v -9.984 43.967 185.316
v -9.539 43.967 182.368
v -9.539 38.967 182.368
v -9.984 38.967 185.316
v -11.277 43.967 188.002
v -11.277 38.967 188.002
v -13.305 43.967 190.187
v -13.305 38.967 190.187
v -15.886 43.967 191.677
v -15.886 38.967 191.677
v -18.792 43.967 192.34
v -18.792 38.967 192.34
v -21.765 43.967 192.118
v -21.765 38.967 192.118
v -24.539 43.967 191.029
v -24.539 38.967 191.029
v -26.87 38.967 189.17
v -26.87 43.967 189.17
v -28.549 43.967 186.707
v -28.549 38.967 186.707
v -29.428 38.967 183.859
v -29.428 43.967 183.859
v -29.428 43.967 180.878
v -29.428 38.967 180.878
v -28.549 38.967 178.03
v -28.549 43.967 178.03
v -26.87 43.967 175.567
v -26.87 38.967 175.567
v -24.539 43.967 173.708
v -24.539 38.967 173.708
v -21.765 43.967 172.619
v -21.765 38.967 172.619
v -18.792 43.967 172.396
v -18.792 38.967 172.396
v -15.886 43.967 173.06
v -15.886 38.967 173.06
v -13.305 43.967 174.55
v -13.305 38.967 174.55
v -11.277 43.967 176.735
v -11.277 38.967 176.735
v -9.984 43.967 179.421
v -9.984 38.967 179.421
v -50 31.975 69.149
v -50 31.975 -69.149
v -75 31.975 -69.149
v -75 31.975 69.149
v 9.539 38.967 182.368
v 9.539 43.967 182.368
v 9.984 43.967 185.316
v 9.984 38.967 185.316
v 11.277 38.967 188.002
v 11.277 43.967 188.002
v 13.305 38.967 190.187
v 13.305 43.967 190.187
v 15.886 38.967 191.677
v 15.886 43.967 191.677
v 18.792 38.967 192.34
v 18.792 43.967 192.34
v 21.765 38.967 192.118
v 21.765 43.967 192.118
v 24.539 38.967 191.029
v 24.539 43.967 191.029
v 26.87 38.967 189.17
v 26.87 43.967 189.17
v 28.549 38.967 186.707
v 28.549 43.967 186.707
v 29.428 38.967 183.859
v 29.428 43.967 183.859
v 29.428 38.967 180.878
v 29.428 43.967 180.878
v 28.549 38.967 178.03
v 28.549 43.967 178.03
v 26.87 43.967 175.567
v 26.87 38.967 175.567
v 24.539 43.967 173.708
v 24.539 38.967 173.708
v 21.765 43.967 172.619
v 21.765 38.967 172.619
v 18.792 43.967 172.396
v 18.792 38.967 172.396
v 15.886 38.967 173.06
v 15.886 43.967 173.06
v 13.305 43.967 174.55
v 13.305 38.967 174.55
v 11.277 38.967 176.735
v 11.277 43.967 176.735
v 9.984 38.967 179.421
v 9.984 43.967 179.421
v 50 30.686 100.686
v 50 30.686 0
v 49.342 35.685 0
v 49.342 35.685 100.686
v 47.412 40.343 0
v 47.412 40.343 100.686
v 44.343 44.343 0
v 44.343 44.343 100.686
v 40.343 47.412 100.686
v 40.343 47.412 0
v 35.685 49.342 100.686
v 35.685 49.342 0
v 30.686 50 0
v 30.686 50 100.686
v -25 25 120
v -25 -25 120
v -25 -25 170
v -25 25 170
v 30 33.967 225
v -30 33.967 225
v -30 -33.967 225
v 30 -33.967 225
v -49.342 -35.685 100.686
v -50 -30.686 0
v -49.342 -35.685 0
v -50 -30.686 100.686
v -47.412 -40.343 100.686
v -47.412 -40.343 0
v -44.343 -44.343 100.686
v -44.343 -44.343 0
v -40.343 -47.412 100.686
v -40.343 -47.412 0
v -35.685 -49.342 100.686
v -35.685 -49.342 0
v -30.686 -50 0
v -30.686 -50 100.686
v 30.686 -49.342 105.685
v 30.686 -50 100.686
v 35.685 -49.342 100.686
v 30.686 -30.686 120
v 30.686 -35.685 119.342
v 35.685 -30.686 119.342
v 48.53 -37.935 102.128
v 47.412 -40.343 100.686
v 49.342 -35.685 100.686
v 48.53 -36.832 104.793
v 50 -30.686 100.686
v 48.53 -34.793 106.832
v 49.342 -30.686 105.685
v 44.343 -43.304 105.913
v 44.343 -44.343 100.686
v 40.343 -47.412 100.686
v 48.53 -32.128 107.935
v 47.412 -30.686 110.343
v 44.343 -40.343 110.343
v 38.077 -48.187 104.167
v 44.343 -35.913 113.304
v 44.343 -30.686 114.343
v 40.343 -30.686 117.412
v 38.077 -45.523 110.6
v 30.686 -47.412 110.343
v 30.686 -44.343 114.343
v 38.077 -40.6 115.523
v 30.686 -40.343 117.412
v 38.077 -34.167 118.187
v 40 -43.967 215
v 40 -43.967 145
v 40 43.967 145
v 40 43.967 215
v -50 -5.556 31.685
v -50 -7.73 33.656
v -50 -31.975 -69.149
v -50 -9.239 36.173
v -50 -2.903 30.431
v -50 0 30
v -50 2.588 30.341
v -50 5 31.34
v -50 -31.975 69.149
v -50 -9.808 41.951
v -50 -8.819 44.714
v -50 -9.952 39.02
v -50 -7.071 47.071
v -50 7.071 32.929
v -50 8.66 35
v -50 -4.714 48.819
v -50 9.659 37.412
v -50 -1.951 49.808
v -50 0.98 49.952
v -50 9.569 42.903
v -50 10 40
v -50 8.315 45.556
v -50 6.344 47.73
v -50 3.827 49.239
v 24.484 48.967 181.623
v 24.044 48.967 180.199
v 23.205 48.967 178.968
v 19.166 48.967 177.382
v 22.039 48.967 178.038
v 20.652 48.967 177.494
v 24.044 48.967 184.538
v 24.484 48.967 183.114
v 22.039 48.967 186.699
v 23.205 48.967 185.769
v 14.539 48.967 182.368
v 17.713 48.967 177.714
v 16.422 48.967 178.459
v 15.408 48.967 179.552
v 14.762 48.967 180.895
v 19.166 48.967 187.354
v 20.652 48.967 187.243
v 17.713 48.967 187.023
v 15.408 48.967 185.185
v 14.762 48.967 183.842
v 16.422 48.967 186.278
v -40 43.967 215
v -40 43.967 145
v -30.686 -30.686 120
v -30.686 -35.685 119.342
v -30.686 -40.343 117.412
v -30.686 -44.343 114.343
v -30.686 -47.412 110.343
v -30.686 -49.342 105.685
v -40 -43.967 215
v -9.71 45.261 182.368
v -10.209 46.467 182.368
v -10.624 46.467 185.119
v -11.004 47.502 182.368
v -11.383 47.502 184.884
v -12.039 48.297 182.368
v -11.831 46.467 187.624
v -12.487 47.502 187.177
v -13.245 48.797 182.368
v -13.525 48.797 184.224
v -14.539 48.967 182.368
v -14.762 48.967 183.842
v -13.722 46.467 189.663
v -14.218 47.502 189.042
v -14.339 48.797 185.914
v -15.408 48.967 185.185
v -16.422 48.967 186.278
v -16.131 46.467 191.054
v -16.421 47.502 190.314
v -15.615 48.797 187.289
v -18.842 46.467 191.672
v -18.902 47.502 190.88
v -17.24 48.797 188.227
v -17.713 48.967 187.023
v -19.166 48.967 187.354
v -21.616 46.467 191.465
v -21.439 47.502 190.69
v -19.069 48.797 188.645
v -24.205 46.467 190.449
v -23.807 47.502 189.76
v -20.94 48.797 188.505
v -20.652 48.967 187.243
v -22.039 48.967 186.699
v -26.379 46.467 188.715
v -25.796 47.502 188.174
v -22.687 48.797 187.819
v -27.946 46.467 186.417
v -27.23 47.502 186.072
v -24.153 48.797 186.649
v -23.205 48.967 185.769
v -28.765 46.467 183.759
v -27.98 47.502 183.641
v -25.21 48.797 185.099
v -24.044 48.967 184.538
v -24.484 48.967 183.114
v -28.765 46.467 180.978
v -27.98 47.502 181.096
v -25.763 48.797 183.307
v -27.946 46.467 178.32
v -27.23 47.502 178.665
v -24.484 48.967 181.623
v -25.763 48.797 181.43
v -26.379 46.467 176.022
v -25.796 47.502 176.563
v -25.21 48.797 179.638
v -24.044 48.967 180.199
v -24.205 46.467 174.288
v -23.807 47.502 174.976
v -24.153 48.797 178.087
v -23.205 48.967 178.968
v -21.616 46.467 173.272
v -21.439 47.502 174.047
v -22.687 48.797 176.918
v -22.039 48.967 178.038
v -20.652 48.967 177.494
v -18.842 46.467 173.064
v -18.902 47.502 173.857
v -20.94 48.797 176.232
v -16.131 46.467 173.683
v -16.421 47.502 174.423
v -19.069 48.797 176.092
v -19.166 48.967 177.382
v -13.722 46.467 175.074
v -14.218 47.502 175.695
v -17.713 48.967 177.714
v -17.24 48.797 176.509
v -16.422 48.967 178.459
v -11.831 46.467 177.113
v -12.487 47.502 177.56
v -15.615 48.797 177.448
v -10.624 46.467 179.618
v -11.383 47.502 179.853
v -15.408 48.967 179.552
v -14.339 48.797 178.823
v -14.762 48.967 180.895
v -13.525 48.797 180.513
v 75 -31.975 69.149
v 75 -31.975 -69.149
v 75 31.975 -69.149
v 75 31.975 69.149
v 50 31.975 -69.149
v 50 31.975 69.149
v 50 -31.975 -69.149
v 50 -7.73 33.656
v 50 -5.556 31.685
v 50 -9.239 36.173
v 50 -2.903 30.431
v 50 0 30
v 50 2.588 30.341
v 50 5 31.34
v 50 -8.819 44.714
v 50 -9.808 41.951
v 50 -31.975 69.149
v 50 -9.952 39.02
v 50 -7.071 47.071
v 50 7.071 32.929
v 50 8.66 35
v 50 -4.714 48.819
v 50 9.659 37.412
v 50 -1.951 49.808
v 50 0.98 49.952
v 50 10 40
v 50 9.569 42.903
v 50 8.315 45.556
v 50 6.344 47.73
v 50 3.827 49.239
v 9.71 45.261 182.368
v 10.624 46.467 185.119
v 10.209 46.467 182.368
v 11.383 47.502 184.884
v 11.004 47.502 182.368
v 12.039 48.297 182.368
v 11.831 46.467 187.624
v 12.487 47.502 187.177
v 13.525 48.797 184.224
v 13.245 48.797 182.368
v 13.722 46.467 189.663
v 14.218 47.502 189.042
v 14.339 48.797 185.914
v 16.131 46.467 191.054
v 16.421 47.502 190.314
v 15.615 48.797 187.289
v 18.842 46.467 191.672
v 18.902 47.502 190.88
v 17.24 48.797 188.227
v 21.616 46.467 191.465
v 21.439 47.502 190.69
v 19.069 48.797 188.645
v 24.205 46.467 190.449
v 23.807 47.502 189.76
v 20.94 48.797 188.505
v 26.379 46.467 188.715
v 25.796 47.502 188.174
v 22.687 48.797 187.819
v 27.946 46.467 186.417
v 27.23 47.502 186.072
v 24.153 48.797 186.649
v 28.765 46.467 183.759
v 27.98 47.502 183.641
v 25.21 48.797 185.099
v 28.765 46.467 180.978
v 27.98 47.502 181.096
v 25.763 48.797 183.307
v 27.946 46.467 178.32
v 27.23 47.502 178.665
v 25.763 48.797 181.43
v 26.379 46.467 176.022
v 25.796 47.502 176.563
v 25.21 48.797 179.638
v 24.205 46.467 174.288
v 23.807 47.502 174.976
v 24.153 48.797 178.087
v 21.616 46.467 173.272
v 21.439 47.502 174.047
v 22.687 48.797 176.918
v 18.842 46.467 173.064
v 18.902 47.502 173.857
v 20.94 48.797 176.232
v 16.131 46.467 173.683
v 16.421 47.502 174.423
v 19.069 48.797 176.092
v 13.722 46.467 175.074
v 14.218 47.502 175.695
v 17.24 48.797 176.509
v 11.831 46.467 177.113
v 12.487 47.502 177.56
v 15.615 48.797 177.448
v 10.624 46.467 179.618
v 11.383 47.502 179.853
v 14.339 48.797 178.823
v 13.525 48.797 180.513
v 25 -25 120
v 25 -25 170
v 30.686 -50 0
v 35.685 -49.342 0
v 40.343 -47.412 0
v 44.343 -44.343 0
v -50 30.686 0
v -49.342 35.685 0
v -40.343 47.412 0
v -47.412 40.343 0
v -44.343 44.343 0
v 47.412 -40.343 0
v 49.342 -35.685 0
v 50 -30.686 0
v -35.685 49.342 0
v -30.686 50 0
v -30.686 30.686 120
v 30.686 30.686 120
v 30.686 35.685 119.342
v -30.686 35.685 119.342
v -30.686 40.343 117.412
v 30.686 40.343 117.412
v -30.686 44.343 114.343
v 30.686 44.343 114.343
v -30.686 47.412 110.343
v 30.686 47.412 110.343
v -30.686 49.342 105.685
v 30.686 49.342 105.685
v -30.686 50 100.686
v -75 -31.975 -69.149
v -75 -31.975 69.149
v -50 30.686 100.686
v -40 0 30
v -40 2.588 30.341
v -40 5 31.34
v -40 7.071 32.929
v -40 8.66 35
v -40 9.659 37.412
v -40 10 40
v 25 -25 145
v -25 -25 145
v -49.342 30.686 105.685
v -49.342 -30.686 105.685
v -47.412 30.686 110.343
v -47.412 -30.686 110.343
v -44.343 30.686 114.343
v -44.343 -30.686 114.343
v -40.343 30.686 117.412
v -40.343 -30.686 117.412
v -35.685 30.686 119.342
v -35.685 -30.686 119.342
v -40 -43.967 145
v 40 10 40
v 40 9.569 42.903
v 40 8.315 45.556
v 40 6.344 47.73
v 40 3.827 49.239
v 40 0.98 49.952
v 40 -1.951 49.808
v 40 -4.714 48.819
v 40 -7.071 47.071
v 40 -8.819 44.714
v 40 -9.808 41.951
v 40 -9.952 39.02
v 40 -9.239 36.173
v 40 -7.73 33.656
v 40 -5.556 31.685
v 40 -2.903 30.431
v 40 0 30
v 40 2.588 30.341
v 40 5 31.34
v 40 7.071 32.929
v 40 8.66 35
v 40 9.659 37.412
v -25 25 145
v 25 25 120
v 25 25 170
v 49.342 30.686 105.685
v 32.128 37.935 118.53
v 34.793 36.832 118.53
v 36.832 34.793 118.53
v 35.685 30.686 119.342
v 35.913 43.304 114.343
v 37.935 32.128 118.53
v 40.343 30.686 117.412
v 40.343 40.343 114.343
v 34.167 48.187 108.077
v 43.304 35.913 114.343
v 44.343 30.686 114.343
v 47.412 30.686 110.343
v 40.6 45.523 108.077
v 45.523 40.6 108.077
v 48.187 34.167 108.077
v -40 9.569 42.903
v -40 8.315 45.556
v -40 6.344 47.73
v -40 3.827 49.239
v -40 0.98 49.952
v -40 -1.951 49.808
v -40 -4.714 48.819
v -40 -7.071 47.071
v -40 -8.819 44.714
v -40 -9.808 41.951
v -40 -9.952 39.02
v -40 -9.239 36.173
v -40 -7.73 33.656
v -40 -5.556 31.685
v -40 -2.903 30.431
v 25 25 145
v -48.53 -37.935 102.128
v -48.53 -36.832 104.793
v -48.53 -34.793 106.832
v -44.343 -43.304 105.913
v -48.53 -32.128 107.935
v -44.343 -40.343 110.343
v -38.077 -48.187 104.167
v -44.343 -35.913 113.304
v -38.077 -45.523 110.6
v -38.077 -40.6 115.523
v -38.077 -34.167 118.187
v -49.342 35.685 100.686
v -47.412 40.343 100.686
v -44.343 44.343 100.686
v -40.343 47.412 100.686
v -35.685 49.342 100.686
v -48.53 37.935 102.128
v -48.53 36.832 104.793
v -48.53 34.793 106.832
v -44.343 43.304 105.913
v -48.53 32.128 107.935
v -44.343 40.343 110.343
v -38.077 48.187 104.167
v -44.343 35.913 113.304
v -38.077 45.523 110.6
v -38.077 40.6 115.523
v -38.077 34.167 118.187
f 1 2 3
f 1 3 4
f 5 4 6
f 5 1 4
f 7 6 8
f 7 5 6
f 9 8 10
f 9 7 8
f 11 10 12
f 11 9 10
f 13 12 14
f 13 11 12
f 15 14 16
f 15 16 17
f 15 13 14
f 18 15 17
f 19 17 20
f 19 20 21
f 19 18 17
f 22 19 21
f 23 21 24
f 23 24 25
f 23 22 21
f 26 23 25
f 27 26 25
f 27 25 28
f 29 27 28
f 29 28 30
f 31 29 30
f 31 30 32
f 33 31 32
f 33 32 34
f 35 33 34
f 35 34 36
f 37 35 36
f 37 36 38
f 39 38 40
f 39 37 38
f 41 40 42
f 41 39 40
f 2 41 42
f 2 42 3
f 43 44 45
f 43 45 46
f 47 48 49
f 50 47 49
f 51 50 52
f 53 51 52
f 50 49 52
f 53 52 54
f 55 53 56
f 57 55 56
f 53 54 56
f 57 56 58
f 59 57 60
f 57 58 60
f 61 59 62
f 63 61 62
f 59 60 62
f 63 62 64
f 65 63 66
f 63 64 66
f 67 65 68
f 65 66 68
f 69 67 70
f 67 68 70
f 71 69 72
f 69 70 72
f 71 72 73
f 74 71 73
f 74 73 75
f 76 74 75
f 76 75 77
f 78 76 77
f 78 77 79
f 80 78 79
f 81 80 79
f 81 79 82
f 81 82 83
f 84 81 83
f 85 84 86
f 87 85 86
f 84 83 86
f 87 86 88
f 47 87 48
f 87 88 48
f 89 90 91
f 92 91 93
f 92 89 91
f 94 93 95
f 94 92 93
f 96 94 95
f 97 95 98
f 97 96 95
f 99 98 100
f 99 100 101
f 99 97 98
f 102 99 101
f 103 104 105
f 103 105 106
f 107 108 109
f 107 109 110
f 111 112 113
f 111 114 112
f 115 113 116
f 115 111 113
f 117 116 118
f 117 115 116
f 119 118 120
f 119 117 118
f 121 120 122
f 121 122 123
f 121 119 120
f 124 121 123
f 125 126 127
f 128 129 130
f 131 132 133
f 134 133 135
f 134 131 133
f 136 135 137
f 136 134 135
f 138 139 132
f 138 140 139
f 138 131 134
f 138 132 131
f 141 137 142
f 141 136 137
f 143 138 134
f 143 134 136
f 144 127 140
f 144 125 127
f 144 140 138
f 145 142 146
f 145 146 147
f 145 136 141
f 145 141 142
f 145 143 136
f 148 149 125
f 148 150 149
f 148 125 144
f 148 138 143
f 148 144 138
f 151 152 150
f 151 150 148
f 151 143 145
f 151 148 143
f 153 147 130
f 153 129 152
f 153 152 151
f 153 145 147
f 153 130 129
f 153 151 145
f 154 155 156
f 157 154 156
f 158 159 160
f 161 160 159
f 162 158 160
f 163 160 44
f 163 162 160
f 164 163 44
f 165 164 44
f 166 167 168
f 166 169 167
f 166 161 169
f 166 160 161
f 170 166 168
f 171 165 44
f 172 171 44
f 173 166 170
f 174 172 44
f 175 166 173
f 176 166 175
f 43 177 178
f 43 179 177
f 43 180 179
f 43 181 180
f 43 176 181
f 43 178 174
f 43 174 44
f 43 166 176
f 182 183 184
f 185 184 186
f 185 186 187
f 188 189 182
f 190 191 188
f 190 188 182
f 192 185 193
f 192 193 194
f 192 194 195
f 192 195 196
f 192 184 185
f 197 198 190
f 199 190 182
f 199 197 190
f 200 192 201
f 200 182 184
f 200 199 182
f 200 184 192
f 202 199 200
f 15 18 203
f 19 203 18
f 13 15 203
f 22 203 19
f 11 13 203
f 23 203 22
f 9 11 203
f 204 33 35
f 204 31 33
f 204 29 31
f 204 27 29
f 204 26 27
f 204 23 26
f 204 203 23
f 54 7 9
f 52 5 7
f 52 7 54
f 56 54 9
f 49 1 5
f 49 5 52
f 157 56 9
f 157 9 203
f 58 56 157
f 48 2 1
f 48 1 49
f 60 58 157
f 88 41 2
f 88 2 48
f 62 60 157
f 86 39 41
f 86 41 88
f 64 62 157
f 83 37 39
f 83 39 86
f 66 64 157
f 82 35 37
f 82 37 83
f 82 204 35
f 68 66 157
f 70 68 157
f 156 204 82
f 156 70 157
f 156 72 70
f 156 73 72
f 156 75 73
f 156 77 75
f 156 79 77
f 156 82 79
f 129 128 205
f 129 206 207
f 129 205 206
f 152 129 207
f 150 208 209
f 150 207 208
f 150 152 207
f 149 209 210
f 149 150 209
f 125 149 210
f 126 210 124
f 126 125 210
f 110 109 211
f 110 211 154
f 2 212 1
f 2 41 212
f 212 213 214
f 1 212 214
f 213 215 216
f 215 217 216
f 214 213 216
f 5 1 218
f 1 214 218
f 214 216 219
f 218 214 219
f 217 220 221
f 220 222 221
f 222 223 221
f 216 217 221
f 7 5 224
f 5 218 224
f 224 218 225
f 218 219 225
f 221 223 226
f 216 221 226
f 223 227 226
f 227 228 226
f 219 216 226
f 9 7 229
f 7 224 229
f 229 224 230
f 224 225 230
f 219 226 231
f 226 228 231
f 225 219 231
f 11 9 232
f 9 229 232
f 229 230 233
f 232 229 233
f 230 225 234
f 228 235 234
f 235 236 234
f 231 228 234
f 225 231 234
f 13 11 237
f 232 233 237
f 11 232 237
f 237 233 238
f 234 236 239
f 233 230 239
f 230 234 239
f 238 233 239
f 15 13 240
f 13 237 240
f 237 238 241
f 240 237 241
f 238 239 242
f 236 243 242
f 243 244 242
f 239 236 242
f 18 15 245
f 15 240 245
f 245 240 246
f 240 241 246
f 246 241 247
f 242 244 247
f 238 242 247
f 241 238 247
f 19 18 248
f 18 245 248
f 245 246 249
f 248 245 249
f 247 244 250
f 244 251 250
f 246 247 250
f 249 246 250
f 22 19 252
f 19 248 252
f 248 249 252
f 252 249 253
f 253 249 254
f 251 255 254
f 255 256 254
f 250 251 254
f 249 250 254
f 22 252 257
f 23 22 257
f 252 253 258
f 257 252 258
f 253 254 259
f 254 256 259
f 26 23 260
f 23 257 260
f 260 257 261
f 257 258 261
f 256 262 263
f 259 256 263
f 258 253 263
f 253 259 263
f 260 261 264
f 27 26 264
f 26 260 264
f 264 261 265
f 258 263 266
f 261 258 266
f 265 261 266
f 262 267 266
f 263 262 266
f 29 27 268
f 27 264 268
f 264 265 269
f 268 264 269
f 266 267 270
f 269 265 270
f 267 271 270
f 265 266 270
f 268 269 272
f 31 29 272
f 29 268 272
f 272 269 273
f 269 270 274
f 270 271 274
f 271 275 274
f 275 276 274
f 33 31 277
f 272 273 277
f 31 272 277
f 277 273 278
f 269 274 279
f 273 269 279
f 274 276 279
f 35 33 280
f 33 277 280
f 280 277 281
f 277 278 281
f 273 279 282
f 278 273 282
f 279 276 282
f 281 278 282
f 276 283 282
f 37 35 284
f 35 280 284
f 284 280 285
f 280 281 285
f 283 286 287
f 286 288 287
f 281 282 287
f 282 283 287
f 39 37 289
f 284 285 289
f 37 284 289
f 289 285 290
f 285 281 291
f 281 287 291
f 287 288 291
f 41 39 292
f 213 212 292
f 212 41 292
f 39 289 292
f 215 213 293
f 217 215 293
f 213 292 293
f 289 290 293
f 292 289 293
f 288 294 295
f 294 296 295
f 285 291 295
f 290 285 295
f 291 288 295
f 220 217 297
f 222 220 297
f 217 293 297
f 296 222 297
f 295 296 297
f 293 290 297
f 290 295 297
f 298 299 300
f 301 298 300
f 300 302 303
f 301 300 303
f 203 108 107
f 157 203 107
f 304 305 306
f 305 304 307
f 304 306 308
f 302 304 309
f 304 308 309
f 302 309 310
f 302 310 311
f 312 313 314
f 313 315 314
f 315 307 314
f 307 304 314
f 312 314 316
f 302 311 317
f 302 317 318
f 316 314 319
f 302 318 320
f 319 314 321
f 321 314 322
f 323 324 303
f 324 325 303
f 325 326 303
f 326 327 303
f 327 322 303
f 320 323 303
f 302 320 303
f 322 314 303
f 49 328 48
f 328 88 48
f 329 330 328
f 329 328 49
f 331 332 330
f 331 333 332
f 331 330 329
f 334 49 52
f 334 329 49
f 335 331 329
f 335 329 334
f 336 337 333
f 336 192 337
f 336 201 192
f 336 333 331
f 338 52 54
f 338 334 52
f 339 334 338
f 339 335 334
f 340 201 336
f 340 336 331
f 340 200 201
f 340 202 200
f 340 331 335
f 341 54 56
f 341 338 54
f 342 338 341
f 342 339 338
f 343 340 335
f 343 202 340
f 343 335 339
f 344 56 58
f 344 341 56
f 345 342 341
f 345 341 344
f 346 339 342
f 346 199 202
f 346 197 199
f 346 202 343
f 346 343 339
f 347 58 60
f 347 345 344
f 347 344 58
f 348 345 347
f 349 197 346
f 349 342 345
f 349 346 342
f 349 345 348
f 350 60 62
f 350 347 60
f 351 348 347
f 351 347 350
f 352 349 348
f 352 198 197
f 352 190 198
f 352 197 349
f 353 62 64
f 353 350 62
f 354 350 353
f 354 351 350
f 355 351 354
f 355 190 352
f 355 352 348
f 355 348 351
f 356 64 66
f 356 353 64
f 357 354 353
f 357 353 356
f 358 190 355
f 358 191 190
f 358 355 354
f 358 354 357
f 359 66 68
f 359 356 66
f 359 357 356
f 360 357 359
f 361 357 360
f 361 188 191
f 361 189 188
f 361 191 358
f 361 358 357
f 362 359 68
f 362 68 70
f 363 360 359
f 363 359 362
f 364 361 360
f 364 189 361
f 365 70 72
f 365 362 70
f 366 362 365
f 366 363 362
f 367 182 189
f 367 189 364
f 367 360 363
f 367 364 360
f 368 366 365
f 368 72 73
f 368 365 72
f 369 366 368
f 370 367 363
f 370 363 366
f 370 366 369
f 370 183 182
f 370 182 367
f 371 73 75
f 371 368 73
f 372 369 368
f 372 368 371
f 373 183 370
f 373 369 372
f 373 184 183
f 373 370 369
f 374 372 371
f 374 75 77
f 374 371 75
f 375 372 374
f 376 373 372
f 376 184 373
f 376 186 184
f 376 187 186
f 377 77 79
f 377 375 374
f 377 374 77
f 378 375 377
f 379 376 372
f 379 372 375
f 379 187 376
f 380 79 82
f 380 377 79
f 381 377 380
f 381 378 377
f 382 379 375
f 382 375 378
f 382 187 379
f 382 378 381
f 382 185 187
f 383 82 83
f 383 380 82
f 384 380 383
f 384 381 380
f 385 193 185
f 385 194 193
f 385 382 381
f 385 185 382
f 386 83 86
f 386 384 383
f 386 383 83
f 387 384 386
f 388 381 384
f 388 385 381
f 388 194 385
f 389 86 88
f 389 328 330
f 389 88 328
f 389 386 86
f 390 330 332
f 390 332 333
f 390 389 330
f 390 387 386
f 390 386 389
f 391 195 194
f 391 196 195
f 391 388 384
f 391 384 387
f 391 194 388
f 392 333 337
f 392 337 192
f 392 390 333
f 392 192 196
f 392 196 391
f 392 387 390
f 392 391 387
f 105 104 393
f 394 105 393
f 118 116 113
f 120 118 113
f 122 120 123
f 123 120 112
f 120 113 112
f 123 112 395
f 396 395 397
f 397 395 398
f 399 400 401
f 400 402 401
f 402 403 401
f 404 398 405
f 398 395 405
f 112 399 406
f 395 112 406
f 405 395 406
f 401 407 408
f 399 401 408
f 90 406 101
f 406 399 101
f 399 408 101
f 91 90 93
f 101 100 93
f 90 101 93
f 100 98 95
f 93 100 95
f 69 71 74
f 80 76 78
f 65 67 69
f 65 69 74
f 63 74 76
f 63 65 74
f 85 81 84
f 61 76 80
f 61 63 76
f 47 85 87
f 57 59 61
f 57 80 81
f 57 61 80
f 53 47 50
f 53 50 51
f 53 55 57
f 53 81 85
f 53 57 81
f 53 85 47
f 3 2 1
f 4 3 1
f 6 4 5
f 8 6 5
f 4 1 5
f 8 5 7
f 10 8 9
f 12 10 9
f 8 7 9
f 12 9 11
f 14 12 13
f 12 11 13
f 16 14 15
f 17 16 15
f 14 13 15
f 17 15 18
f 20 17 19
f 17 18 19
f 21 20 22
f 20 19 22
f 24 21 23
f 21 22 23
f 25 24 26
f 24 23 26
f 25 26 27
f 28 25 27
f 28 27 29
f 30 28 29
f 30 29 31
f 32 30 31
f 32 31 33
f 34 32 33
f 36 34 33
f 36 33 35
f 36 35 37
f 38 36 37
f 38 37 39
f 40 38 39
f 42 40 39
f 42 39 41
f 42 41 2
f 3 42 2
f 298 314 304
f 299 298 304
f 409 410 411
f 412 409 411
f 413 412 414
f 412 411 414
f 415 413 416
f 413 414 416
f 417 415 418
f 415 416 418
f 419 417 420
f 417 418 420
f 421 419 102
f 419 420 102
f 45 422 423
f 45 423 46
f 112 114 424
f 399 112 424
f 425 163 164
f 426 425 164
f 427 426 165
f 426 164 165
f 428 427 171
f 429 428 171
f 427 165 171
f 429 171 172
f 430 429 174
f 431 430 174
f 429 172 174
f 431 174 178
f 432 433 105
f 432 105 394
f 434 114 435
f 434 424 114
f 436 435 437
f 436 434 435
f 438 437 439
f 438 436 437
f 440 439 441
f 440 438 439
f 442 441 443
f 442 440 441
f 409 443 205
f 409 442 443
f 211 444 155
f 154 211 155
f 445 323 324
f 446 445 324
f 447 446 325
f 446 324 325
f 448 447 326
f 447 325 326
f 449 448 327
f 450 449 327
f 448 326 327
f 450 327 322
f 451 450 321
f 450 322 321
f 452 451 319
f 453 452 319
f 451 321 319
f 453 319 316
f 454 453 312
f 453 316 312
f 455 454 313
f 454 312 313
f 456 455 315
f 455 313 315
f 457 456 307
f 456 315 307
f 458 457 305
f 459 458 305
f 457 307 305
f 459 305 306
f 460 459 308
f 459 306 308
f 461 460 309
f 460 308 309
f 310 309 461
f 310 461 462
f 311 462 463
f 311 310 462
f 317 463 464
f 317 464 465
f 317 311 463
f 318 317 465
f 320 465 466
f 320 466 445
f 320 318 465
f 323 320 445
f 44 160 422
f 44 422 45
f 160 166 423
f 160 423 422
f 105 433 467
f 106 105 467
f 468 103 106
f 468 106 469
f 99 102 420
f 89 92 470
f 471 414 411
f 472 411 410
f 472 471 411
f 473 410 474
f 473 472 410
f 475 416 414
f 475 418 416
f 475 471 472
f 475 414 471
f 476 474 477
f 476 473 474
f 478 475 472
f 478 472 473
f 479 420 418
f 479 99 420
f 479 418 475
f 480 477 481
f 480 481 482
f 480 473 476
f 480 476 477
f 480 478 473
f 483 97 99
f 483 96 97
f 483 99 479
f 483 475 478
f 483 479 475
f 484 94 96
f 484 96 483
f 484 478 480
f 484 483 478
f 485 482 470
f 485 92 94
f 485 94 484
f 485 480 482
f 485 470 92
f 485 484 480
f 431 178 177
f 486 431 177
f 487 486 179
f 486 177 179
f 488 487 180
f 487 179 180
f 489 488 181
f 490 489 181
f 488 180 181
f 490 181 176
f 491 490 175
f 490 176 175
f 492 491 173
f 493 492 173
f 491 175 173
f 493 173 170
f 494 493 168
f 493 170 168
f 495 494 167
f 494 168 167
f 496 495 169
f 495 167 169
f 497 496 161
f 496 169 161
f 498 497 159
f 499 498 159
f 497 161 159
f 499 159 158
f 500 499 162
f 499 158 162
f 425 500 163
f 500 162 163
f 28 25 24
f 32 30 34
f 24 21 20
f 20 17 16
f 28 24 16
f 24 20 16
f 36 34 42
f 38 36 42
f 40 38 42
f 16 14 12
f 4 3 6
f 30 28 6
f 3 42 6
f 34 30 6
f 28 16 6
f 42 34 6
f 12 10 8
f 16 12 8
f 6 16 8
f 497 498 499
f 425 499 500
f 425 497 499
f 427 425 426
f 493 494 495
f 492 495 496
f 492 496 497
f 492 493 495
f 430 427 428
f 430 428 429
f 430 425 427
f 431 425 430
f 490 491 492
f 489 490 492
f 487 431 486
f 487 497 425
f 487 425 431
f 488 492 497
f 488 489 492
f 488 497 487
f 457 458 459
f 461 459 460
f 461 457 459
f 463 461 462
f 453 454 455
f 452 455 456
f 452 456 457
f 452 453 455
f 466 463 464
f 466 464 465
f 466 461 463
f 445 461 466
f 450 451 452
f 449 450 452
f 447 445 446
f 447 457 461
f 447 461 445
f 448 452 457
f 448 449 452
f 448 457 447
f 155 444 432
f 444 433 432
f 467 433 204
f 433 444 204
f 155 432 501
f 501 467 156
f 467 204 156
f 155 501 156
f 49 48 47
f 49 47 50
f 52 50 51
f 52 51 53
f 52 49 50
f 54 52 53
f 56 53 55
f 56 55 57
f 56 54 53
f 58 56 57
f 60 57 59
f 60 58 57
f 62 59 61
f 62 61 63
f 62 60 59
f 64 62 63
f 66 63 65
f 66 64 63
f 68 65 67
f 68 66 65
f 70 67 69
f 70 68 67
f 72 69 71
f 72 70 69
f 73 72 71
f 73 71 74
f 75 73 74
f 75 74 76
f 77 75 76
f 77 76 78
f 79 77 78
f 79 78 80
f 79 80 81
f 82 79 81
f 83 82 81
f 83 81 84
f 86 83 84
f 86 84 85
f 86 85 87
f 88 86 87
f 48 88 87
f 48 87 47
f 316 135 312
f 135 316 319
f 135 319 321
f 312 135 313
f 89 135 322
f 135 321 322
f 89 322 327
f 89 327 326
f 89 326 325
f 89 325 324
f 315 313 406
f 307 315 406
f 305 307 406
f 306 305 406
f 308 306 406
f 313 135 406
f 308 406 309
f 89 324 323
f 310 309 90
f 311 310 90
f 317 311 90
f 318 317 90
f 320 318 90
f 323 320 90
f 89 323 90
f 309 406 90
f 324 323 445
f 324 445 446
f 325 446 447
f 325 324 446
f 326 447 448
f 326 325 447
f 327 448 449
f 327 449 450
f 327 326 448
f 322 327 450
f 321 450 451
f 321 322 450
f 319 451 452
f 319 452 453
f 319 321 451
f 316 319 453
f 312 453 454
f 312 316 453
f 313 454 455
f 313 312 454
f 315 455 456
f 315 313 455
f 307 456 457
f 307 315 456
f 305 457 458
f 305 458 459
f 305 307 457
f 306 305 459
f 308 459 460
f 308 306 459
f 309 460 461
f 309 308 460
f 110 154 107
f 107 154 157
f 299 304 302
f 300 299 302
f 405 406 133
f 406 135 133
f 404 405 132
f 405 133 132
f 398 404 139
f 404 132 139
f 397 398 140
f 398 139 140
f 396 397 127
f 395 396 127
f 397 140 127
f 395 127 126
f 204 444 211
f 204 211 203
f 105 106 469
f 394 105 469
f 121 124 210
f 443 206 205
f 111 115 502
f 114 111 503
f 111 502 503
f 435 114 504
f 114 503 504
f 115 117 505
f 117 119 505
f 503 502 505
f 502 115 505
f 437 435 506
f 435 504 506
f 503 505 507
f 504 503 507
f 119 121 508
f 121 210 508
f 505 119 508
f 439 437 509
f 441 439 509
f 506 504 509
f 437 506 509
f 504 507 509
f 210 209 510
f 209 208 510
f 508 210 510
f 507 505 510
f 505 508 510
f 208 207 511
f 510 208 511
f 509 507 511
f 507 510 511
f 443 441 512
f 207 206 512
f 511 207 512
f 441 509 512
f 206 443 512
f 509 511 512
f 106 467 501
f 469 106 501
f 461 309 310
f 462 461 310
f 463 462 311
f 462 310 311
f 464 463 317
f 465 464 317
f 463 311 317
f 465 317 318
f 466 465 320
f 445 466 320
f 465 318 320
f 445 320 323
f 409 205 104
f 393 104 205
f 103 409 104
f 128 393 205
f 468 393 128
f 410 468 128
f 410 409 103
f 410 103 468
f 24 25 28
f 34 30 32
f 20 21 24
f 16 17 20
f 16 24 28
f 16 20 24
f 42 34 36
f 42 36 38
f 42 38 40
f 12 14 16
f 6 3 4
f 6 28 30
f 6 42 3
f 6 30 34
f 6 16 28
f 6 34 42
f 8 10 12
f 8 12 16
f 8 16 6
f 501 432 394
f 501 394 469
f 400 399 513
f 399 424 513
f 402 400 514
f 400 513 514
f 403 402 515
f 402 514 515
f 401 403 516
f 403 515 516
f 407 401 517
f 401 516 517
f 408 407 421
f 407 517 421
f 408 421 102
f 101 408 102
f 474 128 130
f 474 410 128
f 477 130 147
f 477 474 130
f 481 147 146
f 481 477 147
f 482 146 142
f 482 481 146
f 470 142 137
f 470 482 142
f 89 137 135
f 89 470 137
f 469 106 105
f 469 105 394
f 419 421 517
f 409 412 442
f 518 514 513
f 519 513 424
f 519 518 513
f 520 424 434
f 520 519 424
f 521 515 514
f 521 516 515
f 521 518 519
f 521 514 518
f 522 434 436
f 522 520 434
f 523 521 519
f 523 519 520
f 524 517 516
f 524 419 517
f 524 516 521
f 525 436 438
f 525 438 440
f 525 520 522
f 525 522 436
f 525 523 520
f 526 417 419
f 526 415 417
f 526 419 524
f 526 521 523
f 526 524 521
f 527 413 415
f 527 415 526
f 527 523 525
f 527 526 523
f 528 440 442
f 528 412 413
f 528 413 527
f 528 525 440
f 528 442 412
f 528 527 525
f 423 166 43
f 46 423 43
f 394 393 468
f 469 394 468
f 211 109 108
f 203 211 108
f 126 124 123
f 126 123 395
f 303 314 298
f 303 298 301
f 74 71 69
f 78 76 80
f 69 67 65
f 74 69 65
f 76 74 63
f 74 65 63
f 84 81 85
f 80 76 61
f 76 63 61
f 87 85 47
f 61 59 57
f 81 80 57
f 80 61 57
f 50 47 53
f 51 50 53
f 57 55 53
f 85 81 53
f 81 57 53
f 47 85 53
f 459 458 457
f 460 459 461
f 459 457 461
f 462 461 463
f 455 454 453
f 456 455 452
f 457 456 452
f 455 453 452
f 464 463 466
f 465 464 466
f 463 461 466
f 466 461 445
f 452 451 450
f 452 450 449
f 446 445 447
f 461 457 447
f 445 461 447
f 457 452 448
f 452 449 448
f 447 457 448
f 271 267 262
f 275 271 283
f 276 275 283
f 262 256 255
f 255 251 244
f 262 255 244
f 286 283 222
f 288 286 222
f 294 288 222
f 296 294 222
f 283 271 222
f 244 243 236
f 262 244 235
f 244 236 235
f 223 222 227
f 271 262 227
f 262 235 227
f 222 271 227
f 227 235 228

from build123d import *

# Parameters (mm, degrees)
F0_W      = 100
F0_H      = 100
F1_DEPTH  = 120
F2_W      = 50
F2_H      = 50
F3_DEPTH  = 50
F5_W      = 80
F5_H      = 87.9338901418
F6_DEPTH  = 80
F9_DEPTH  = 10
F10_W     = 63.9507248998
F10_H     = 69.1487565637
F11_DEPTH = 25
F14_R     = 19.313708499
F15_SIZE  = 10
F16_R     = 10
F17_DEPTH = 5
F20_R     = 5
F20_2_R   = 5


with BuildPart() as f1:
    # F0 (on Top) → F1 (new body)
    with BuildSketch(Plane.XY):
        Rectangle(F0_W, F0_H)
    extrude(amount=F1_DEPTH)

    # F2 (on face) → F3 (join)
    with BuildSketch(Plane.XY.offset(120)):
        Rectangle(F2_W, F2_H)
    extrude(amount=F3_DEPTH)


with BuildPart() as f6:
    # F5 (on offset) → F6 (new body)
    with BuildSketch(Plane.XY.offset(145)):
        Rectangle(F5_W, F5_H)
    extrude(amount=F6_DEPTH)

    # F7: cut F1
    add(f1.part, mode=Mode.SUBTRACT)

    # F15
    f15_edges = [f6.edges().sort_by_distance(p)[0] for p in [
        (-40, 0, 225),
        (0, 43.966945, 225),
        (40, 0, 225),
        (0, -43.966945, 225),
    ]]
    chamfer(f15_edges, length=F15_SIZE)


with BuildPart() as f9:
    # F8 (on face) → F9 (new body)
    with BuildSketch(Plane.YZ.offset(50)):
        with BuildLine():
            ThreePointArc((10, 40), (-7.0710678119, 47.0710678119), (0, 30))
            ThreePointArc((0, 30), (7.0710678119, 32.9289321881), (10, 40))
        make_face()
    extrude(amount=-F9_DEPTH)

    # F10 (on face) → F11 (join)
    with BuildSketch(Plane.YZ.offset(50)):
        with Locations((0, -34.5743782818)):
            Rectangle(F10_W, F10_H)
        with Locations((0, 34.5743782818)):
            Rectangle(F10_W, F10_H)
    extrude(amount=F11_DEPTH)


with BuildPart() as f1_1:
    add(f1.part)

    # F12: cut F9
    add(f9.part, mode=Mode.SUBTRACT)

    # F14
    f14_edges = [f1_1.edges().sort_by_distance(p)[0] for p in [
        (0, -50, 120),
        (-50, -50, 60),
        (50, -50, 60),
        (50, 50, 60),
        (0, 50, 120),
        (50, 0, 120),
        (-50, 50, 60),
        (-50, 0, 120),
    ]]
    fillet(f14_edges, radius=F14_R)


with BuildPart() as f13_1:
    # F13: instance of F9
    add(f9.part.mirror(Plane.YZ))


with BuildPart() as f17:
    # F16 (on face) → F17 (new body, symmetric)
    with BuildSketch(Plane(origin=(0, 43.9669450709, 0), x_dir=(-1, 0, 0), z_dir=(0, 1, 0))):
        with Locations((-19.5394717157, 182.368427515)):
            Circle(F16_R)
    extrude(amount=F17_DEPTH, both=True)


with BuildPart() as f18_1:
    # F18: instance of F17
    add(f17.part.mirror(Plane.YZ))


with BuildPart() as f6_1:
    add(f6.part)

    # F19: cut F17, F18_1
    add(f17.part, mode=Mode.SUBTRACT)
    add(f18_1.part, mode=Mode.SUBTRACT)


with BuildPart() as f17_1:
    add(f17.part)

    # F20
    f20_edges = [f17_1.edges().sort_by_distance(p)[0] for p in [
        (29.539472, 48.966945, 182.368428),
    ]]
    fillet(f20_edges, radius=F20_R)


with BuildPart() as f18_1_1:
    add(f18_1.part)

    # F20#2
    f20_2_edges = [f18_1_1.edges().sort_by_distance(p)[0] for p in [
        (-29.539472, 48.966945, 182.368428),
    ]]
    fillet(f20_2_edges, radius=F20_2_R)


solid = Compound([f9.part, f1_1.part, f13_1.part, f6_1.part, f17_1.part, f18_1_1.part])
